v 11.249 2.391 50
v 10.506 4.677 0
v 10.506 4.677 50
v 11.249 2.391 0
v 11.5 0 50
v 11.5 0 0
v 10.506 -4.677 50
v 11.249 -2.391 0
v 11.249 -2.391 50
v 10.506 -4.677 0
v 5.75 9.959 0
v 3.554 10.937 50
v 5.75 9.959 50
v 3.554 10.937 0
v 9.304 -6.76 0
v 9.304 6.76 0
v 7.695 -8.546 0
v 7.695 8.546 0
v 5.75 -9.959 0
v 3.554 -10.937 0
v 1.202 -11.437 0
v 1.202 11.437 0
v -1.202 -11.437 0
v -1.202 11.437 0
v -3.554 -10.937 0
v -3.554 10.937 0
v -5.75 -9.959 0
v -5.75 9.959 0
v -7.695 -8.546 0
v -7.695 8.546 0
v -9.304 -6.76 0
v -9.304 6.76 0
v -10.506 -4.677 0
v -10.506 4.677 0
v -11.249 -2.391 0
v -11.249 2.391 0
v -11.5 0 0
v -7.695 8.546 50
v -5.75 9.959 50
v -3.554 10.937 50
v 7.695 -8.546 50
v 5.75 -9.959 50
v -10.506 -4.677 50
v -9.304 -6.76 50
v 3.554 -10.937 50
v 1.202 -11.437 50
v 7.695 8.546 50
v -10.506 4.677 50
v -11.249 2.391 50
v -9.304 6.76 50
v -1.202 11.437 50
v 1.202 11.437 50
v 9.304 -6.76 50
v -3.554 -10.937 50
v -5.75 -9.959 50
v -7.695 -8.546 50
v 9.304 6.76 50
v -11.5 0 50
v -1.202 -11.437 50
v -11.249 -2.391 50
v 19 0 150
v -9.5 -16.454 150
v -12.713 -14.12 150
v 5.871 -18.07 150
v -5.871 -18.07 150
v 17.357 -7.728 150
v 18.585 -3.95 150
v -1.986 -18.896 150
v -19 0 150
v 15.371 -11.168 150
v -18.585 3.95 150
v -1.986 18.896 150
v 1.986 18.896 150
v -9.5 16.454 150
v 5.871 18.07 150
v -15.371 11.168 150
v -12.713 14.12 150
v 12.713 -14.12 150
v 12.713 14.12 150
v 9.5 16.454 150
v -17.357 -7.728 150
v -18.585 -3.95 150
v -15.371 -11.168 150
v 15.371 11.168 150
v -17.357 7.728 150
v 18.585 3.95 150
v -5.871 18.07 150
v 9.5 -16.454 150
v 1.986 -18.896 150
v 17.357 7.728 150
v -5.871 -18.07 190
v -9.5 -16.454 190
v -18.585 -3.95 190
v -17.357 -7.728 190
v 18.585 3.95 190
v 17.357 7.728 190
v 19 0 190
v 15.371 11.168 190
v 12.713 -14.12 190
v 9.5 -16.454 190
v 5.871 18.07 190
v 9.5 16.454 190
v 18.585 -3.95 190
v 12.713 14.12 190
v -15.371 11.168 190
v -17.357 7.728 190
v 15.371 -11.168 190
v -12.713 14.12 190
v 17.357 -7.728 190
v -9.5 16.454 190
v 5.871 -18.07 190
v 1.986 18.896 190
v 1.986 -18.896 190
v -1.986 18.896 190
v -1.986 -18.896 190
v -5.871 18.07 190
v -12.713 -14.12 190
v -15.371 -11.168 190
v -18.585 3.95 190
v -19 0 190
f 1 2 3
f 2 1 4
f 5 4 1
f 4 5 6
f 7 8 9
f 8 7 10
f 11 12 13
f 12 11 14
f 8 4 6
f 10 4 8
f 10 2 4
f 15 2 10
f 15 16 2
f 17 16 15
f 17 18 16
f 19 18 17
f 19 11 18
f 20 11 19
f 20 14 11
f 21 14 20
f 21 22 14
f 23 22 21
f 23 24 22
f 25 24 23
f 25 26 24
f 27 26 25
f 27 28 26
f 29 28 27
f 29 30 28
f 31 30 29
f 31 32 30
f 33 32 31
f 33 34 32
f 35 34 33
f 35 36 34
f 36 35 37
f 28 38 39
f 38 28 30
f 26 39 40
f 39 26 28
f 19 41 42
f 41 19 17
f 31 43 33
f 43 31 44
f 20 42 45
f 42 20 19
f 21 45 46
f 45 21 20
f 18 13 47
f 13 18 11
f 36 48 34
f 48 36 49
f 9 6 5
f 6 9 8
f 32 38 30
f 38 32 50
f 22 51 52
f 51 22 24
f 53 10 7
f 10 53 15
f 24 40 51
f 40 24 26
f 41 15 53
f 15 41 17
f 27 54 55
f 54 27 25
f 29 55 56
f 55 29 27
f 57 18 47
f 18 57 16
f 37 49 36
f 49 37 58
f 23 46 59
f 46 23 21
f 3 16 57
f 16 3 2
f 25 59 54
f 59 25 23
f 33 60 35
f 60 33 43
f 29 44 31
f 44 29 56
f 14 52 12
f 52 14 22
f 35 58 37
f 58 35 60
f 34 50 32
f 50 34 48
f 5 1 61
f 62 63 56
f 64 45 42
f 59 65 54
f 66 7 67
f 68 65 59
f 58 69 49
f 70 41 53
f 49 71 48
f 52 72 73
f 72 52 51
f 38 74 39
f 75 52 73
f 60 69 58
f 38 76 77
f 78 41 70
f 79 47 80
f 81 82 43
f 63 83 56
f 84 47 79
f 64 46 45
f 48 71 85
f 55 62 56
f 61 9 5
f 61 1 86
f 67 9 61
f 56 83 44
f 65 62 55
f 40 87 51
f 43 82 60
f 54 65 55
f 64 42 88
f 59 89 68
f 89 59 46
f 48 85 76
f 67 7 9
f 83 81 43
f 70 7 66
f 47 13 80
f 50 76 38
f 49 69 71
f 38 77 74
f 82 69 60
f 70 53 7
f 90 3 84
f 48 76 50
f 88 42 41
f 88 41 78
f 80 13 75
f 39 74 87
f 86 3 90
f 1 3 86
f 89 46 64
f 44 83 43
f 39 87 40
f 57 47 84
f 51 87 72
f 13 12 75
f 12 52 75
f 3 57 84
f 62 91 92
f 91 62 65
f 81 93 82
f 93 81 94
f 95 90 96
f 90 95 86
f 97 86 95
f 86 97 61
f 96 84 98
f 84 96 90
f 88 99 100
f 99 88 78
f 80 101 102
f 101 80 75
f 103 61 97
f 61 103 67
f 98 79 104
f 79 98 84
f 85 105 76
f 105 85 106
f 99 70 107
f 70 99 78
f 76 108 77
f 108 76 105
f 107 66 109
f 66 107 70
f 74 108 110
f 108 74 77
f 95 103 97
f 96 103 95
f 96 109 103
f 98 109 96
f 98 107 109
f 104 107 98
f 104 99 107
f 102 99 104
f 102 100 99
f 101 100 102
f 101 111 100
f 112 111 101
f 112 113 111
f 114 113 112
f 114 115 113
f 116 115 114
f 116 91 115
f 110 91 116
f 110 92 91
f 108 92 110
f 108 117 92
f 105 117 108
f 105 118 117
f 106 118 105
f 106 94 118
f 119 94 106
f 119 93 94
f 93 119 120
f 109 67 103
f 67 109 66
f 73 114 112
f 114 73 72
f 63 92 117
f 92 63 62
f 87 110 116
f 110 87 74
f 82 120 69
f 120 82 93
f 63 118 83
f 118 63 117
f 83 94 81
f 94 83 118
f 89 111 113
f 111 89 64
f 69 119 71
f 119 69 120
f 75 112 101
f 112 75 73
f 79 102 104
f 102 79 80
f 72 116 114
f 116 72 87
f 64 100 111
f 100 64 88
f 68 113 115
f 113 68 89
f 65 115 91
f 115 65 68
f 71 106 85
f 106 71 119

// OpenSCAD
/**
 * MIT License
 *
 * Copyright (c) 2026 Adam Kuczyński
 *
 * Permission is hereby granted, free of charge, to any person obtaining a copy
 * of this software and associated documentation files (the "Software"), to deal
 * in the Software without restriction, including without limitation the rights
 * to use, copy, modify, merge, publish, distribute, sublicense, and/or sell
 * copies of the Software, and to permit persons to whom the Software is
 * furnished to do so, subject to the following conditions:
 *
 * The above copyright notice and this permission notice shall be included in all
 * copies or substantial portions of the Software.
 *
 * THE SOFTWARE IS PROVIDED "AS IS", WITHOUT WARRANTY OF ANY KIND, EXPRESS OR
 * IMPLIED, INCLUDING BUT NOT LIMITED TO THE WARRANTIES OF MERCHANTABILITY,
 * FITNESS FOR A PARTICULAR PURPOSE AND NONINFRINGEMENT. IN NO EVENT SHALL THE
 * AUTHORS OR COPYRIGHT HOLDERS BE LIABLE FOR ANY CLAIM, DAMAGES OR OTHER
 * LIABILITY, WHETHER IN AN ACTION OF CONTRACT, TORT OR OTHERWISE, ARISING FROM,
 * OUT OF OR IN CONNECTION WITH THE SOFTWARE OR THE USE OR OTHER DEALINGS IN THE
 * SOFTWARE.
 */

difference() {
    union($fn = 500) {
      translate([0, 0, 25])
        cylinder(d = 23, h = 50, center = true);
      translate([0, 0, 100])  
        cylinder(d1 = 23, d2 = 38, h = 100, center = true);
      translate([0, 0, 170])
        cylinder(d = 38, h = 40, center = true);
    }
}
